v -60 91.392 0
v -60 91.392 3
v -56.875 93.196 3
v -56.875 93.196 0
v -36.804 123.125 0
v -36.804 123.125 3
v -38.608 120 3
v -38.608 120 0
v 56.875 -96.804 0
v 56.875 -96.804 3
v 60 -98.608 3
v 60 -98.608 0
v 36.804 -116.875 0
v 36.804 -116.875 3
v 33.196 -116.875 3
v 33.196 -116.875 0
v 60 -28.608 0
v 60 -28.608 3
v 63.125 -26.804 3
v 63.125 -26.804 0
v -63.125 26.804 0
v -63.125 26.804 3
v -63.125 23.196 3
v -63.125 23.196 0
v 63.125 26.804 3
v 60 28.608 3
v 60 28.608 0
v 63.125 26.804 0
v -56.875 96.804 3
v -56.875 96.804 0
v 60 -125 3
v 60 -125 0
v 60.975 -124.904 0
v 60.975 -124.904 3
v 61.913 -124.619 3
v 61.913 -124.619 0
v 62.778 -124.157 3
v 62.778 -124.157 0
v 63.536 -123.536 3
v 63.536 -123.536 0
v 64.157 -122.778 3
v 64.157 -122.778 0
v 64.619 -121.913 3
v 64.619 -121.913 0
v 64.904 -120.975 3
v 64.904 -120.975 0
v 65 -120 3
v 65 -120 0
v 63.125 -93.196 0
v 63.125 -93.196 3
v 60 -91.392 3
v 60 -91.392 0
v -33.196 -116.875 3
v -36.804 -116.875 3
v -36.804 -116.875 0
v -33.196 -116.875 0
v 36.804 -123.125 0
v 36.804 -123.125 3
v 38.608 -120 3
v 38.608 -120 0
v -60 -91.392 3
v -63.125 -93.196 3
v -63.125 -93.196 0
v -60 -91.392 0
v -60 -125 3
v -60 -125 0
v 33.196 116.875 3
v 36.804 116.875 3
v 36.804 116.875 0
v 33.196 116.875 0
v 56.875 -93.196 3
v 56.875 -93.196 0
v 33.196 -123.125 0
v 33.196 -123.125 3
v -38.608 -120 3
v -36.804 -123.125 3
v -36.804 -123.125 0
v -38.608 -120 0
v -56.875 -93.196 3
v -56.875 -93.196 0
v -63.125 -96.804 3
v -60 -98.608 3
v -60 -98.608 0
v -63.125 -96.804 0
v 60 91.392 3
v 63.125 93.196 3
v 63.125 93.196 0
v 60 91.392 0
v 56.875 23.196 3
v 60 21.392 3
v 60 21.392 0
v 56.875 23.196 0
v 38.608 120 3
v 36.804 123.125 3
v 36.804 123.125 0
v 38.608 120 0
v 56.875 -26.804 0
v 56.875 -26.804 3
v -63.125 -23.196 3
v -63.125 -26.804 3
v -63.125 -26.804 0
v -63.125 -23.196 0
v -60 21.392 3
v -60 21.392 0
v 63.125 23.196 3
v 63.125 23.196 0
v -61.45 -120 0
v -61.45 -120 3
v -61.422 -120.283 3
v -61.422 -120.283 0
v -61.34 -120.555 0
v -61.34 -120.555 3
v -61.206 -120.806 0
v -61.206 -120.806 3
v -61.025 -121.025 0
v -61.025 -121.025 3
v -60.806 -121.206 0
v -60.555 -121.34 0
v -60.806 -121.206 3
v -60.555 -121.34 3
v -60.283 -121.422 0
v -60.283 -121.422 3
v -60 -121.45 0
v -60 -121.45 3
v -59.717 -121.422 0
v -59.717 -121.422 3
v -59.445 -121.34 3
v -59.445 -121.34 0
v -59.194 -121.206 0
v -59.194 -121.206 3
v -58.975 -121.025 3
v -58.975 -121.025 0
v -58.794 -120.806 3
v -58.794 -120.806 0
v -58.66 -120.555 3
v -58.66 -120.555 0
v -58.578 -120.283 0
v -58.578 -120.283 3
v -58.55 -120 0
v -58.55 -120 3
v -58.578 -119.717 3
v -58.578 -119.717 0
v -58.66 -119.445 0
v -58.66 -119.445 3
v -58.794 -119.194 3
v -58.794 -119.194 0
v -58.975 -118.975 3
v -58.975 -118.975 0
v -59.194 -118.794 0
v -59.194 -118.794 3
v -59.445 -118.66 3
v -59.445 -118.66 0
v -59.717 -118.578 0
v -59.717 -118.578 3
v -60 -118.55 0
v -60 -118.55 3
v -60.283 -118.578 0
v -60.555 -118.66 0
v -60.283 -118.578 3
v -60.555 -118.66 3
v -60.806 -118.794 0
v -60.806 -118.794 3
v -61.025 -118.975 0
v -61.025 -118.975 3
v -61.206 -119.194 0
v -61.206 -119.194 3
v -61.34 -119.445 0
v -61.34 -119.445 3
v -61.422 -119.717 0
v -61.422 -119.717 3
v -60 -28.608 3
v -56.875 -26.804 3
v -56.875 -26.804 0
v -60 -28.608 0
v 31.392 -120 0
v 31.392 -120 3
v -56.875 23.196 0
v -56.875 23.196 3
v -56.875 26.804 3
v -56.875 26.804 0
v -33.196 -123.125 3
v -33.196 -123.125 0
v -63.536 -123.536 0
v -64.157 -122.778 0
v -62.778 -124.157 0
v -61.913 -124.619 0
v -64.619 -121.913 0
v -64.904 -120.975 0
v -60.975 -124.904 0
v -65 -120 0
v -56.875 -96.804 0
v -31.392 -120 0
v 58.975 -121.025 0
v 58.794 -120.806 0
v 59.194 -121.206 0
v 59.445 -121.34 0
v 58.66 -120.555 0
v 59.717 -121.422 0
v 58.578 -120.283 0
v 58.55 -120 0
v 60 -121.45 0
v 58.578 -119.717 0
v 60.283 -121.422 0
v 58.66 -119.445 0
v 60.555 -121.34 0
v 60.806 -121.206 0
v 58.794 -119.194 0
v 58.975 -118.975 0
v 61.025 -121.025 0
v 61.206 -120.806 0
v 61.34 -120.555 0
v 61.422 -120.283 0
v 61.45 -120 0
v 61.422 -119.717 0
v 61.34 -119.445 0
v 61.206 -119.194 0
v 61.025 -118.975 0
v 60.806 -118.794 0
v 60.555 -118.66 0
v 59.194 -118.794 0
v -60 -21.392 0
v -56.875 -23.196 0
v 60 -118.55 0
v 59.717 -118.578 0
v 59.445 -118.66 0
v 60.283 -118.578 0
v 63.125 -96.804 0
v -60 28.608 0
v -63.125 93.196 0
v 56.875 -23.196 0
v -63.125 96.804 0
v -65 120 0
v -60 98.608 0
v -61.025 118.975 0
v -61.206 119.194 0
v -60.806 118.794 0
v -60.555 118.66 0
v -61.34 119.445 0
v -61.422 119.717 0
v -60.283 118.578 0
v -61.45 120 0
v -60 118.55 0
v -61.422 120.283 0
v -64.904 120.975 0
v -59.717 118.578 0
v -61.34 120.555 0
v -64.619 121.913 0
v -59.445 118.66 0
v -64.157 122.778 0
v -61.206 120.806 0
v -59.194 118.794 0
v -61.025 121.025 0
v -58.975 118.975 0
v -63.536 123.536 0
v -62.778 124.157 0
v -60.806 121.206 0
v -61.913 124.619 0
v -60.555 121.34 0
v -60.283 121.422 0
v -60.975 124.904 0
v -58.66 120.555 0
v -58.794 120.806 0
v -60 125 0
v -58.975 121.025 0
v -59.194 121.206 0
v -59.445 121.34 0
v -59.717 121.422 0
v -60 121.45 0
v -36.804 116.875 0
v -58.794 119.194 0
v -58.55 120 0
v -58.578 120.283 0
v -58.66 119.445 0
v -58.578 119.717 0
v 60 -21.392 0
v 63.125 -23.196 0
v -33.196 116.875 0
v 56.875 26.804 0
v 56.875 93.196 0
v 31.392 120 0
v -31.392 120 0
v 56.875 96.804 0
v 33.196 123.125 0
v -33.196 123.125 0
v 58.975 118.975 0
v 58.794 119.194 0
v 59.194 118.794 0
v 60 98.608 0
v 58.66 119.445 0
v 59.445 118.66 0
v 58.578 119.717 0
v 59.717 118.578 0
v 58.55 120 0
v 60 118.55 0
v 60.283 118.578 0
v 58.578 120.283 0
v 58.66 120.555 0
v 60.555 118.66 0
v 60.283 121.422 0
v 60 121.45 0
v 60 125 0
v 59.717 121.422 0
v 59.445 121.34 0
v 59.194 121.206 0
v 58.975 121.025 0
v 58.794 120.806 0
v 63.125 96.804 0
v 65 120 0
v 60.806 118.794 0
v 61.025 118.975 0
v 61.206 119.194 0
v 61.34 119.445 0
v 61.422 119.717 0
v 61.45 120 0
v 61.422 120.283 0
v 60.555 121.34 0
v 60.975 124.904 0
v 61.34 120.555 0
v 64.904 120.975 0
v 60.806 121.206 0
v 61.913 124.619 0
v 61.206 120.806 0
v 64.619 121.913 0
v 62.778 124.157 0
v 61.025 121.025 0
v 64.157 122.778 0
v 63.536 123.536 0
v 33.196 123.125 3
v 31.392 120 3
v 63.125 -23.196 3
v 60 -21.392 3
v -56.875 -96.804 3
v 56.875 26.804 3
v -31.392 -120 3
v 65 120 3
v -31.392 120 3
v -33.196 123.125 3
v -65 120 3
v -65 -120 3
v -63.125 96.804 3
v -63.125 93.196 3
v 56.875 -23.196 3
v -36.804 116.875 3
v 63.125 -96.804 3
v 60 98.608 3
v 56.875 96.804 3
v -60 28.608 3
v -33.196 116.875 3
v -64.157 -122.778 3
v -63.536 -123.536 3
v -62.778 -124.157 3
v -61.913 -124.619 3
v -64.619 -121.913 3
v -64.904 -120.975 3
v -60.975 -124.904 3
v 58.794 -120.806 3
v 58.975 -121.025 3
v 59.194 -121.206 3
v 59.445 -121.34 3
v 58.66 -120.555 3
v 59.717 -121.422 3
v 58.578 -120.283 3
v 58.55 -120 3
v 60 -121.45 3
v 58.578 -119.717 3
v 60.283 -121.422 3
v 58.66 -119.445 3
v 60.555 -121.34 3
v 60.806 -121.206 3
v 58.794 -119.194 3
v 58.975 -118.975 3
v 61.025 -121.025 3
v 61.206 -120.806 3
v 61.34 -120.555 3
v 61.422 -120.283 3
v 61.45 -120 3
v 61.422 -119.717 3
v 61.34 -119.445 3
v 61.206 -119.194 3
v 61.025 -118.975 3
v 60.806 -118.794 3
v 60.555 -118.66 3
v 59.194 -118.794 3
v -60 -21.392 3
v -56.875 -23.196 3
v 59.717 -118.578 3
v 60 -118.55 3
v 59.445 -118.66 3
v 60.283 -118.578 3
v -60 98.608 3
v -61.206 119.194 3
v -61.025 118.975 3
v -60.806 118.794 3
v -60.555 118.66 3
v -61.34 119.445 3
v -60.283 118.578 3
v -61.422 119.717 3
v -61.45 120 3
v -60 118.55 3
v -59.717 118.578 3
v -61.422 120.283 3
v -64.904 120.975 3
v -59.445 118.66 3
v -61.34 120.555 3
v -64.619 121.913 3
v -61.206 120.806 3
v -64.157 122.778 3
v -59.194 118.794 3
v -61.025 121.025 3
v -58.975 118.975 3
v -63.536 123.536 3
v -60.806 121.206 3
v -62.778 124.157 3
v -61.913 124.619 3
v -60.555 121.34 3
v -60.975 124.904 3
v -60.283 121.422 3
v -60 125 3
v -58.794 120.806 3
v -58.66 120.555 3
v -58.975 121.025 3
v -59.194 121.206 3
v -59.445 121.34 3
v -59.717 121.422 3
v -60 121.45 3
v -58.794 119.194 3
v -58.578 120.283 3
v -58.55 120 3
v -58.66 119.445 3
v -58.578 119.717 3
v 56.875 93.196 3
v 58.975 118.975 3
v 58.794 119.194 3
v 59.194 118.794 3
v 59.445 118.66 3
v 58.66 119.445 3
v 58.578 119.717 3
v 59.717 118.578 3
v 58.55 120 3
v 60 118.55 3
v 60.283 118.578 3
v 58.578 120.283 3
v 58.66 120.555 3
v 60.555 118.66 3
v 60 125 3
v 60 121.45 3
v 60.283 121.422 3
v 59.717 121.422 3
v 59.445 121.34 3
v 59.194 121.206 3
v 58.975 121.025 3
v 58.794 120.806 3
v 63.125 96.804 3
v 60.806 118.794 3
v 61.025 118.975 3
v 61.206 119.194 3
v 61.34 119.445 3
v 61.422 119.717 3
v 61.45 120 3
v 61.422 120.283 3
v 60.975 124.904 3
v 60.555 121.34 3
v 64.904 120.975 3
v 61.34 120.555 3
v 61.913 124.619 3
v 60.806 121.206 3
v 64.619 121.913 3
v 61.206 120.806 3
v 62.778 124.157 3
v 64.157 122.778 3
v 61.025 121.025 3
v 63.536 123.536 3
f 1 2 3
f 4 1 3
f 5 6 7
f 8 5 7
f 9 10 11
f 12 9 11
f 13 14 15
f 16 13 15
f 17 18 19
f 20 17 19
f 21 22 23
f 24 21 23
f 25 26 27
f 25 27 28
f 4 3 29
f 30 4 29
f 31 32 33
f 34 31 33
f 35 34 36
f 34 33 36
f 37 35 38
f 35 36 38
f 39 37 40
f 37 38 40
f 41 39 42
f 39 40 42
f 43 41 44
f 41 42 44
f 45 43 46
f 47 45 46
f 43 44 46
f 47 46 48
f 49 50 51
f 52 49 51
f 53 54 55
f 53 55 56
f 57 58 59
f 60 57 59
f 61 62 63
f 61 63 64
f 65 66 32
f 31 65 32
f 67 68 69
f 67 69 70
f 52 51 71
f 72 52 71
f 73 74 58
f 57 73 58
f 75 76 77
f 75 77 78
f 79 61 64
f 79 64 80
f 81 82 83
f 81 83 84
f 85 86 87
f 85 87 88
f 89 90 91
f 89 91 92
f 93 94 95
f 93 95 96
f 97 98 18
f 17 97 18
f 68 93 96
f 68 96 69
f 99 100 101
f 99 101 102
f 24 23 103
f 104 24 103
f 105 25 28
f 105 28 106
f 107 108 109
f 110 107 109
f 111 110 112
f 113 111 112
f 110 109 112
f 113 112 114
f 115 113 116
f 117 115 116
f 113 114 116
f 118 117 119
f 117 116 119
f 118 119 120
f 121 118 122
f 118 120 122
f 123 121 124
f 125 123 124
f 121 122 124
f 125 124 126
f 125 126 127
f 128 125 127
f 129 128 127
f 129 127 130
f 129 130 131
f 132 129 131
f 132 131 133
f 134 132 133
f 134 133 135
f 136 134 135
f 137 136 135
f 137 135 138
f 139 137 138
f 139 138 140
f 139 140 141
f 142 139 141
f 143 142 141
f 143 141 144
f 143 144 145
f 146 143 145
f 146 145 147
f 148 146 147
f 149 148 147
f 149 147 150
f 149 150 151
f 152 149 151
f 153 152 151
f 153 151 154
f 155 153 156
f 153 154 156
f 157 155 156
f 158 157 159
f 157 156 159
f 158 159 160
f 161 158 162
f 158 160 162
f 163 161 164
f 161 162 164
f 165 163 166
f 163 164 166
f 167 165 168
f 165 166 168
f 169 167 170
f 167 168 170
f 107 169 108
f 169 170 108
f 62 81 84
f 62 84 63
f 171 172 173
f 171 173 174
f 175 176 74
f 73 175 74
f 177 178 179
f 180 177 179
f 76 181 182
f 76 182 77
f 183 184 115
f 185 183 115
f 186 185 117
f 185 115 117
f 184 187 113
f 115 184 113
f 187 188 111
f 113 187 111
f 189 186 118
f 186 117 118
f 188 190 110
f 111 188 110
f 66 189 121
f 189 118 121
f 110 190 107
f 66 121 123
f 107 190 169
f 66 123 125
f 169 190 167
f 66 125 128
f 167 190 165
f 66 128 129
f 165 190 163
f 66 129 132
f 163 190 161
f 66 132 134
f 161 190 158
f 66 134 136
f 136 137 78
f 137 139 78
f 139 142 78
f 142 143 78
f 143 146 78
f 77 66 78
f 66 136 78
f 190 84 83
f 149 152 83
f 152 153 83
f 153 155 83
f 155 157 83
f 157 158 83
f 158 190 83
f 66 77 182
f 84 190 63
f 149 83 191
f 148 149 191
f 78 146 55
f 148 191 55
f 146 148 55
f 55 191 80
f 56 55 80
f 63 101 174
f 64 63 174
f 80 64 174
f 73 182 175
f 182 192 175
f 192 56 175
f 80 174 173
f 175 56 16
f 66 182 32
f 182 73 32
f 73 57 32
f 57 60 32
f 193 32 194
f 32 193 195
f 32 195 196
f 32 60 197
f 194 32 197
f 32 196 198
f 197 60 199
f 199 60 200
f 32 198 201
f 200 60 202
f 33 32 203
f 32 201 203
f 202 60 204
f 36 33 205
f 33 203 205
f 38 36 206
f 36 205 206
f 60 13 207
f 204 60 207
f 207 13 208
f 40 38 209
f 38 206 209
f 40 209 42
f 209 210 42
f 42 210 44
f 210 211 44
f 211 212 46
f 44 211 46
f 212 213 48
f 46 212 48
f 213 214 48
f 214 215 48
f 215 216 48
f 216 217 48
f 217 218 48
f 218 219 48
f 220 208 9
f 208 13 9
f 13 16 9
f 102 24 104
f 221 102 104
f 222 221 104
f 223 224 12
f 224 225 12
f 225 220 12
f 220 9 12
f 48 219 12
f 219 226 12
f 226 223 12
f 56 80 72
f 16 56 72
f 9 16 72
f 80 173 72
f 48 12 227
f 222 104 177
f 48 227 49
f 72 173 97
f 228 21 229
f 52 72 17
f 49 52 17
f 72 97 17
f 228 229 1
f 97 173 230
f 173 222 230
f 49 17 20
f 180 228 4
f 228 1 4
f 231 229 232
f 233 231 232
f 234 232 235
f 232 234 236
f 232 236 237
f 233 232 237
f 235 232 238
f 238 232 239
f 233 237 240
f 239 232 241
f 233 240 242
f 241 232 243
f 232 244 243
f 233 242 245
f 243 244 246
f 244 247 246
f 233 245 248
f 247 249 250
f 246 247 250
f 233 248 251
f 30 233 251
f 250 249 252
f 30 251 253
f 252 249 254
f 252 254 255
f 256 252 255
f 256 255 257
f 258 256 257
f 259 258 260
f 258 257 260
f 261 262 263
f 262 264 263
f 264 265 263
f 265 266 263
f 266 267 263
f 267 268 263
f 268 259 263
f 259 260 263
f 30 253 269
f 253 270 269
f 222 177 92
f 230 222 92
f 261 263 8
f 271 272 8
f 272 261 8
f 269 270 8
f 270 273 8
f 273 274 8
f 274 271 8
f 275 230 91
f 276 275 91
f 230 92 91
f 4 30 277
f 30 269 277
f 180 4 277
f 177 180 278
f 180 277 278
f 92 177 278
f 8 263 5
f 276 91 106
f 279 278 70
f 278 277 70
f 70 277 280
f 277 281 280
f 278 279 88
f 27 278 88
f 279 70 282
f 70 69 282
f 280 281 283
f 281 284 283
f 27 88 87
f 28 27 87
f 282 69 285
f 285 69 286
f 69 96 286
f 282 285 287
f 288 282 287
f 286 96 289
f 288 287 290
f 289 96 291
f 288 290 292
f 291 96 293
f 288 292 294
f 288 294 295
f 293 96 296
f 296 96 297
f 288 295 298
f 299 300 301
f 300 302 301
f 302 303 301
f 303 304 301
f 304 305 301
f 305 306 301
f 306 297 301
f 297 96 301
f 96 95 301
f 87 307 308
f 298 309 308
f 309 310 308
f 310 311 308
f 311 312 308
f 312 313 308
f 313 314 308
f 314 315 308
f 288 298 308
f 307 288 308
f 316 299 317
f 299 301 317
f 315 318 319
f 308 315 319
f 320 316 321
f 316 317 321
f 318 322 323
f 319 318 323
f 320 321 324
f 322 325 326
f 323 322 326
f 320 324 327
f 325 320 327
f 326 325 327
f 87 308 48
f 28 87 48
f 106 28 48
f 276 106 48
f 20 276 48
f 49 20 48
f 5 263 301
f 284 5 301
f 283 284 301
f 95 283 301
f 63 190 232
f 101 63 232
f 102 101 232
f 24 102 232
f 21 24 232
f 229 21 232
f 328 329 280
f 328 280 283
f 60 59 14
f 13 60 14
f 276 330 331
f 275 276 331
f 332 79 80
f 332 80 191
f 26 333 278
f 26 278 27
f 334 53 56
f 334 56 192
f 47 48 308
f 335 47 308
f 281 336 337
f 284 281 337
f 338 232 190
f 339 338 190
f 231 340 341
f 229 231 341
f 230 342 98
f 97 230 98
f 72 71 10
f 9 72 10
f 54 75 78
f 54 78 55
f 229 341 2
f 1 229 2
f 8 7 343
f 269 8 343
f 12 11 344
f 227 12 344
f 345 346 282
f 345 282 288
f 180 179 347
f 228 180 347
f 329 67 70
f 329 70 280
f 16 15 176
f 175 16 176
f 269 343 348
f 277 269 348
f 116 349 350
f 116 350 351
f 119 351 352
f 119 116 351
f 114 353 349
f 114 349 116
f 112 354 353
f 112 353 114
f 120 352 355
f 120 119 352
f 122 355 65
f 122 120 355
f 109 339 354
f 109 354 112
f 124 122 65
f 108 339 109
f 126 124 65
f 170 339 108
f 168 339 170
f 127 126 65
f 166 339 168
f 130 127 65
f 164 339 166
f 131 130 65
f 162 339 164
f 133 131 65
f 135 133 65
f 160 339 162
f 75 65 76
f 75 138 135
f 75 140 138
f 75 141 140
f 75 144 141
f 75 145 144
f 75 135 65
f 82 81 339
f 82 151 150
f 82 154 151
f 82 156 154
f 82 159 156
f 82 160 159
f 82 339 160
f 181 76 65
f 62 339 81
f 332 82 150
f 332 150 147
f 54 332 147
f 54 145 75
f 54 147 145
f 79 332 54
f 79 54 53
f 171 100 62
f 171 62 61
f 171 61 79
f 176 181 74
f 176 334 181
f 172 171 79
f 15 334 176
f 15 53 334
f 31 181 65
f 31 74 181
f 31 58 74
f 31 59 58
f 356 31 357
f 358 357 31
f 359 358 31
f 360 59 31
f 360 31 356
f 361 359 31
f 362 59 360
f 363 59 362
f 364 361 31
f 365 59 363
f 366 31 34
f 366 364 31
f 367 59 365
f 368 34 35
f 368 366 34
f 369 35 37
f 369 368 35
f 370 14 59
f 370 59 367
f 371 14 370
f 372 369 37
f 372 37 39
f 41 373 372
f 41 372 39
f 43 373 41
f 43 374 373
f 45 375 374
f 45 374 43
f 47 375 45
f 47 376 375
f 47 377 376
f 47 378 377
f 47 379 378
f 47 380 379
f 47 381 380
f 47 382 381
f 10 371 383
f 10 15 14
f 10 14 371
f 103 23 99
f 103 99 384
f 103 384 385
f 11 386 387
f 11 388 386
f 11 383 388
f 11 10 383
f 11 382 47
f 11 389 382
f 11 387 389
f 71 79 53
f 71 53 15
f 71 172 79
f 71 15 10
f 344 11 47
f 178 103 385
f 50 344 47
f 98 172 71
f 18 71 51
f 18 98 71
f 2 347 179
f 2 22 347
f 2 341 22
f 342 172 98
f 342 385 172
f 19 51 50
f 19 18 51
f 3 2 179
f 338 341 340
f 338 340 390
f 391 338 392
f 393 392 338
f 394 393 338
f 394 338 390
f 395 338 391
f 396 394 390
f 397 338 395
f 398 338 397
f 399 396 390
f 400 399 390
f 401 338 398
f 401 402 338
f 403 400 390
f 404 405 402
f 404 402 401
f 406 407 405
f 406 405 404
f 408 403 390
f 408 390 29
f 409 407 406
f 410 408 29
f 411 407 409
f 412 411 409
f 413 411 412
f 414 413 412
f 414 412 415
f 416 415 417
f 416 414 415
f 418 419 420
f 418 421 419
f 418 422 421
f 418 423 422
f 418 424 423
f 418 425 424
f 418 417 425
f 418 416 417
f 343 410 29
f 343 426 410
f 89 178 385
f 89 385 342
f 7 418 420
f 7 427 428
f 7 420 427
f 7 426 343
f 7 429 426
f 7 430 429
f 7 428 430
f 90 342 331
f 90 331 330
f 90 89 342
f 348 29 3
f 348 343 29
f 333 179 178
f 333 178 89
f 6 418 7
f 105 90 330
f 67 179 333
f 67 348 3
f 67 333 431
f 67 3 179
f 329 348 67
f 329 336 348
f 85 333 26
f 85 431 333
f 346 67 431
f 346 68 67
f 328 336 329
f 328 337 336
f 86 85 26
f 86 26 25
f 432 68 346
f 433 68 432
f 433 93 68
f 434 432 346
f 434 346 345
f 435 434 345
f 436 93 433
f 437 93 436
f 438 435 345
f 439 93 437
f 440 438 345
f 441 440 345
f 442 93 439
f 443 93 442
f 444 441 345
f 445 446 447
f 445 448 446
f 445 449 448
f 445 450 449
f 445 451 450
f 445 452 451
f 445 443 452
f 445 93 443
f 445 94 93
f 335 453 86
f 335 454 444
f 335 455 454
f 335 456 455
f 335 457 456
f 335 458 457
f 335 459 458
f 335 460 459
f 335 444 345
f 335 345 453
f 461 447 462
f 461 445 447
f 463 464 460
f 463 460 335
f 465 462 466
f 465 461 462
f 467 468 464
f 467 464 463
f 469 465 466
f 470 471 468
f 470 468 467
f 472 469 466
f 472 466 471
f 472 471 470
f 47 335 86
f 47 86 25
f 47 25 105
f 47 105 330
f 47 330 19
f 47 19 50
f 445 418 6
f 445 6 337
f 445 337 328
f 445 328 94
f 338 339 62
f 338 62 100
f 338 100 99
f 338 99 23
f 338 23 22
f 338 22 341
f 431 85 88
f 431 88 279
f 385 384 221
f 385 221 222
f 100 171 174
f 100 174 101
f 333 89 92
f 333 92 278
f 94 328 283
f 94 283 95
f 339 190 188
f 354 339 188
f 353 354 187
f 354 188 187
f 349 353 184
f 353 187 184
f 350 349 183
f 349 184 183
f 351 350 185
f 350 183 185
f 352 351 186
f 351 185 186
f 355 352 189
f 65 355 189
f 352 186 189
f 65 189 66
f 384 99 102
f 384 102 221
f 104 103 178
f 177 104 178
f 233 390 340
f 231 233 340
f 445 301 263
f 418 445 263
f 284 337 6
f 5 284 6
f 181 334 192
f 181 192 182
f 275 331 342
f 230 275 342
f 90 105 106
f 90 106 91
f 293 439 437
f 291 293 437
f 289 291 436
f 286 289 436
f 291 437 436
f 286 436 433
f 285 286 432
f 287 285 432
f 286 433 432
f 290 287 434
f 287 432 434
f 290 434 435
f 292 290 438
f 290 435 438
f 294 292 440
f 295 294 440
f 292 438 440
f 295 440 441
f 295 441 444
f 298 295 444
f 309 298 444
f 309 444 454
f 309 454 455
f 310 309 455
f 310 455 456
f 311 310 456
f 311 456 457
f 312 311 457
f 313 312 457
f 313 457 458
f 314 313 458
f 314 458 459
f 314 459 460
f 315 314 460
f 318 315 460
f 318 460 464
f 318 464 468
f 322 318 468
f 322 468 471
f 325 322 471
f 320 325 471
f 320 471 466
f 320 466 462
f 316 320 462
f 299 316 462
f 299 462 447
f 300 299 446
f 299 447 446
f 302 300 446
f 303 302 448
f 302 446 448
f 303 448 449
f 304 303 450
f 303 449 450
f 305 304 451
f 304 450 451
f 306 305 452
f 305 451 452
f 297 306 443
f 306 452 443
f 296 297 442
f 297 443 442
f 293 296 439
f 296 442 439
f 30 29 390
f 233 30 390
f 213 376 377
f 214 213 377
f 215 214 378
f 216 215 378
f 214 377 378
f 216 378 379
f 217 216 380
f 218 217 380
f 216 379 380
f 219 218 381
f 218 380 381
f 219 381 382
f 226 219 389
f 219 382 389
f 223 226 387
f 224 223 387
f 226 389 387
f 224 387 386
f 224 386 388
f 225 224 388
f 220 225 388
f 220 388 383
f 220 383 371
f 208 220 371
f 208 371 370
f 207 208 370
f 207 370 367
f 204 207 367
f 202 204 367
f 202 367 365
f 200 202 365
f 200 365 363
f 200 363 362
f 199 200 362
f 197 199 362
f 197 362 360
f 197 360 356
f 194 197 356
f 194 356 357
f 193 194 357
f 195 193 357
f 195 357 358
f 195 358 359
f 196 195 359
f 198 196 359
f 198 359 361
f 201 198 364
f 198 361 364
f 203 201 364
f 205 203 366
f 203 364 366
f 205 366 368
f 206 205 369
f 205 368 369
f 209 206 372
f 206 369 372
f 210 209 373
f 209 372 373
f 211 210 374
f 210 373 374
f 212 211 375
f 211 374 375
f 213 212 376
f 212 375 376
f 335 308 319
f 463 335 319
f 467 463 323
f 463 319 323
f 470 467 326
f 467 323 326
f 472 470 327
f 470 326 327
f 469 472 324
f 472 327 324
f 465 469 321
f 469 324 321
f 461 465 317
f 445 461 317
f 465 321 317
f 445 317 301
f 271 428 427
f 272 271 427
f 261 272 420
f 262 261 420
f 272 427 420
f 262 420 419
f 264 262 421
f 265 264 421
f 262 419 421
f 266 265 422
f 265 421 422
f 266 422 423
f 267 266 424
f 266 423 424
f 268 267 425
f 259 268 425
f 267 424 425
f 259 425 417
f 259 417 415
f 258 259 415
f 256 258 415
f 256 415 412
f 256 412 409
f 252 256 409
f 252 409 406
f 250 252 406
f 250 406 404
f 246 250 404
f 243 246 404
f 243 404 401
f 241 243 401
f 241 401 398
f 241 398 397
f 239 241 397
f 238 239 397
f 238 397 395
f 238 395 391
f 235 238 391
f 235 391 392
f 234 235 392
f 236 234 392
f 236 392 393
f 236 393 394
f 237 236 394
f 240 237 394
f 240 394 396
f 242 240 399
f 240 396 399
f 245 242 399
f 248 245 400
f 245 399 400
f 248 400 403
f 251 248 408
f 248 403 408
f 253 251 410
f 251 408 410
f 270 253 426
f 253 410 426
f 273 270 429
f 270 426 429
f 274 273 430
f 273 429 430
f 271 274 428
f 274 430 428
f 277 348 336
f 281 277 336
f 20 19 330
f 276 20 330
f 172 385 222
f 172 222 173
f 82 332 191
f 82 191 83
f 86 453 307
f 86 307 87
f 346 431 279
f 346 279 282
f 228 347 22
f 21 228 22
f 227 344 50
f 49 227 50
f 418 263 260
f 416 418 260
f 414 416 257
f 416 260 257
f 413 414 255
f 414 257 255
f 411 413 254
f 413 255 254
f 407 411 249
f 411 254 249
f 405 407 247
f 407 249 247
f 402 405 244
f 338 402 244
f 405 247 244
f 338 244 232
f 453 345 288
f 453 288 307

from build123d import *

# Parameters (mm, degrees)
BOSS_EXTRUDE1_DEPTH  = 3
SKETCH2_R            = 1.45
CUT_EXTRUDE1_DEPTH   = 141.921964221
CUT_EXTRUDE2_DEPTH   = 141.921964221
MIRROR2_COPY_1_DEPTH = 141.921964221


with BuildPart() as part:
    # Sketch1 → Boss-Extrude1 (new body)
    with BuildSketch(Plane.XY):
        with BuildLine():
            Line((-60, -125), (60, -125))
            ThreePointArc((60, -125), (63.535533906, -123.535533906), (65, -120))
            Line((65, -120), (65, 120))
            ThreePointArc((65, 120), (63.535533906, 123.535533906), (60, 125))
            Line((60, 125), (-60, 125))
            ThreePointArc((-60, 125), (-63.535533906, 123.535533906), (-65, 120))
            Line((-65, 120), (-65, -120))
            ThreePointArc((-65, -120), (-63.535533906, -123.535533906), (-60, -125))
        make_face()
    extrude(amount=BOSS_EXTRUDE1_DEPTH)

    # Sketch2 → Cut-Extrude1 (cut, through all)
    with BuildSketch(Plane.XY.offset(3)):
        with Locations((-60, 120)):
            Circle(SKETCH2_R)
        with Locations(Location((-60, -120, 0), (0, 0, 180))):
            Circle(SKETCH2_R)
        with Locations((60, -120)):
            Circle(SKETCH2_R)
        with Locations(Location((60, 120, 0), (0, 0, 180))):
            Circle(SKETCH2_R)
    extrude(amount=-CUT_EXTRUDE1_DEPTH, mode=Mode.SUBTRACT)

    # Sketch3 → Cut-Extrude2 (cut, through all)
    with BuildSketch(Plane.XY.offset(3)):
        Polygon((-33.195780409, 123.125), (-36.804219591, 123.125), (-38.608439182, 120), (-36.804219591, 116.875), (-33.195780409, 116.875), (-31.391560818, 120), align=None)
        Polygon((-56.875, 96.804219591), (-60, 98.608439182), (-63.125, 96.804219591), (-63.125, 93.195780409), (-60, 91.391560818), (-56.875, 93.195780409), align=None)
        Polygon((-56.875, 26.804219591), (-60, 28.608439182), (-63.125, 26.804219591), (-63.125, 23.195780409), (-60, 21.391560818), (-56.875, 23.195780409), align=None)
    cut_extrude2 = extrude(amount=-CUT_EXTRUDE2_DEPTH, mode=Mode.SUBTRACT)

    # Mirror1: Cut-Extrude2 across plane
    add(cut_extrude2.mirror(Plane(origin=(0, 0, 0), x_dir=(0, 0, 1), z_dir=(1, 0, 0))), mode=Mode.SUBTRACT)

    # Mirror2: Cut-Extrude2 across plane
    add(cut_extrude2.mirror(Plane.ZX), mode=Mode.SUBTRACT)

    # Mirror2 copy 1 sketch → Mirror2 copy 1 (cut, through all)
    with BuildSketch(Plane(origin=(0, 0, 3), x_dir=(-1, 0, 0), z_dir=(0, 0, 1))):
        Polygon((-33.195780409, 123.125), (-36.804219591, 123.125), (-38.608439182, 120), (-36.804219591, 116.875), (-33.195780409, 116.875), (-31.391560818, 120), align=None)
        Polygon((-56.875, 96.804219591), (-60, 98.608439182), (-63.125, 96.804219591), (-63.125, 93.195780409), (-60, 91.391560818), (-56.875, 93.195780409), align=None)
        Polygon((-56.875, 26.804219591), (-60, 28.608439182), (-63.125, 26.804219591), (-63.125, 23.195780409), (-60, 21.391560818), (-56.875, 23.195780409), align=None)
    extrude(amount=-MIRROR2_COPY_1_DEPTH, mode=Mode.SUBTRACT)


solid = part.part
